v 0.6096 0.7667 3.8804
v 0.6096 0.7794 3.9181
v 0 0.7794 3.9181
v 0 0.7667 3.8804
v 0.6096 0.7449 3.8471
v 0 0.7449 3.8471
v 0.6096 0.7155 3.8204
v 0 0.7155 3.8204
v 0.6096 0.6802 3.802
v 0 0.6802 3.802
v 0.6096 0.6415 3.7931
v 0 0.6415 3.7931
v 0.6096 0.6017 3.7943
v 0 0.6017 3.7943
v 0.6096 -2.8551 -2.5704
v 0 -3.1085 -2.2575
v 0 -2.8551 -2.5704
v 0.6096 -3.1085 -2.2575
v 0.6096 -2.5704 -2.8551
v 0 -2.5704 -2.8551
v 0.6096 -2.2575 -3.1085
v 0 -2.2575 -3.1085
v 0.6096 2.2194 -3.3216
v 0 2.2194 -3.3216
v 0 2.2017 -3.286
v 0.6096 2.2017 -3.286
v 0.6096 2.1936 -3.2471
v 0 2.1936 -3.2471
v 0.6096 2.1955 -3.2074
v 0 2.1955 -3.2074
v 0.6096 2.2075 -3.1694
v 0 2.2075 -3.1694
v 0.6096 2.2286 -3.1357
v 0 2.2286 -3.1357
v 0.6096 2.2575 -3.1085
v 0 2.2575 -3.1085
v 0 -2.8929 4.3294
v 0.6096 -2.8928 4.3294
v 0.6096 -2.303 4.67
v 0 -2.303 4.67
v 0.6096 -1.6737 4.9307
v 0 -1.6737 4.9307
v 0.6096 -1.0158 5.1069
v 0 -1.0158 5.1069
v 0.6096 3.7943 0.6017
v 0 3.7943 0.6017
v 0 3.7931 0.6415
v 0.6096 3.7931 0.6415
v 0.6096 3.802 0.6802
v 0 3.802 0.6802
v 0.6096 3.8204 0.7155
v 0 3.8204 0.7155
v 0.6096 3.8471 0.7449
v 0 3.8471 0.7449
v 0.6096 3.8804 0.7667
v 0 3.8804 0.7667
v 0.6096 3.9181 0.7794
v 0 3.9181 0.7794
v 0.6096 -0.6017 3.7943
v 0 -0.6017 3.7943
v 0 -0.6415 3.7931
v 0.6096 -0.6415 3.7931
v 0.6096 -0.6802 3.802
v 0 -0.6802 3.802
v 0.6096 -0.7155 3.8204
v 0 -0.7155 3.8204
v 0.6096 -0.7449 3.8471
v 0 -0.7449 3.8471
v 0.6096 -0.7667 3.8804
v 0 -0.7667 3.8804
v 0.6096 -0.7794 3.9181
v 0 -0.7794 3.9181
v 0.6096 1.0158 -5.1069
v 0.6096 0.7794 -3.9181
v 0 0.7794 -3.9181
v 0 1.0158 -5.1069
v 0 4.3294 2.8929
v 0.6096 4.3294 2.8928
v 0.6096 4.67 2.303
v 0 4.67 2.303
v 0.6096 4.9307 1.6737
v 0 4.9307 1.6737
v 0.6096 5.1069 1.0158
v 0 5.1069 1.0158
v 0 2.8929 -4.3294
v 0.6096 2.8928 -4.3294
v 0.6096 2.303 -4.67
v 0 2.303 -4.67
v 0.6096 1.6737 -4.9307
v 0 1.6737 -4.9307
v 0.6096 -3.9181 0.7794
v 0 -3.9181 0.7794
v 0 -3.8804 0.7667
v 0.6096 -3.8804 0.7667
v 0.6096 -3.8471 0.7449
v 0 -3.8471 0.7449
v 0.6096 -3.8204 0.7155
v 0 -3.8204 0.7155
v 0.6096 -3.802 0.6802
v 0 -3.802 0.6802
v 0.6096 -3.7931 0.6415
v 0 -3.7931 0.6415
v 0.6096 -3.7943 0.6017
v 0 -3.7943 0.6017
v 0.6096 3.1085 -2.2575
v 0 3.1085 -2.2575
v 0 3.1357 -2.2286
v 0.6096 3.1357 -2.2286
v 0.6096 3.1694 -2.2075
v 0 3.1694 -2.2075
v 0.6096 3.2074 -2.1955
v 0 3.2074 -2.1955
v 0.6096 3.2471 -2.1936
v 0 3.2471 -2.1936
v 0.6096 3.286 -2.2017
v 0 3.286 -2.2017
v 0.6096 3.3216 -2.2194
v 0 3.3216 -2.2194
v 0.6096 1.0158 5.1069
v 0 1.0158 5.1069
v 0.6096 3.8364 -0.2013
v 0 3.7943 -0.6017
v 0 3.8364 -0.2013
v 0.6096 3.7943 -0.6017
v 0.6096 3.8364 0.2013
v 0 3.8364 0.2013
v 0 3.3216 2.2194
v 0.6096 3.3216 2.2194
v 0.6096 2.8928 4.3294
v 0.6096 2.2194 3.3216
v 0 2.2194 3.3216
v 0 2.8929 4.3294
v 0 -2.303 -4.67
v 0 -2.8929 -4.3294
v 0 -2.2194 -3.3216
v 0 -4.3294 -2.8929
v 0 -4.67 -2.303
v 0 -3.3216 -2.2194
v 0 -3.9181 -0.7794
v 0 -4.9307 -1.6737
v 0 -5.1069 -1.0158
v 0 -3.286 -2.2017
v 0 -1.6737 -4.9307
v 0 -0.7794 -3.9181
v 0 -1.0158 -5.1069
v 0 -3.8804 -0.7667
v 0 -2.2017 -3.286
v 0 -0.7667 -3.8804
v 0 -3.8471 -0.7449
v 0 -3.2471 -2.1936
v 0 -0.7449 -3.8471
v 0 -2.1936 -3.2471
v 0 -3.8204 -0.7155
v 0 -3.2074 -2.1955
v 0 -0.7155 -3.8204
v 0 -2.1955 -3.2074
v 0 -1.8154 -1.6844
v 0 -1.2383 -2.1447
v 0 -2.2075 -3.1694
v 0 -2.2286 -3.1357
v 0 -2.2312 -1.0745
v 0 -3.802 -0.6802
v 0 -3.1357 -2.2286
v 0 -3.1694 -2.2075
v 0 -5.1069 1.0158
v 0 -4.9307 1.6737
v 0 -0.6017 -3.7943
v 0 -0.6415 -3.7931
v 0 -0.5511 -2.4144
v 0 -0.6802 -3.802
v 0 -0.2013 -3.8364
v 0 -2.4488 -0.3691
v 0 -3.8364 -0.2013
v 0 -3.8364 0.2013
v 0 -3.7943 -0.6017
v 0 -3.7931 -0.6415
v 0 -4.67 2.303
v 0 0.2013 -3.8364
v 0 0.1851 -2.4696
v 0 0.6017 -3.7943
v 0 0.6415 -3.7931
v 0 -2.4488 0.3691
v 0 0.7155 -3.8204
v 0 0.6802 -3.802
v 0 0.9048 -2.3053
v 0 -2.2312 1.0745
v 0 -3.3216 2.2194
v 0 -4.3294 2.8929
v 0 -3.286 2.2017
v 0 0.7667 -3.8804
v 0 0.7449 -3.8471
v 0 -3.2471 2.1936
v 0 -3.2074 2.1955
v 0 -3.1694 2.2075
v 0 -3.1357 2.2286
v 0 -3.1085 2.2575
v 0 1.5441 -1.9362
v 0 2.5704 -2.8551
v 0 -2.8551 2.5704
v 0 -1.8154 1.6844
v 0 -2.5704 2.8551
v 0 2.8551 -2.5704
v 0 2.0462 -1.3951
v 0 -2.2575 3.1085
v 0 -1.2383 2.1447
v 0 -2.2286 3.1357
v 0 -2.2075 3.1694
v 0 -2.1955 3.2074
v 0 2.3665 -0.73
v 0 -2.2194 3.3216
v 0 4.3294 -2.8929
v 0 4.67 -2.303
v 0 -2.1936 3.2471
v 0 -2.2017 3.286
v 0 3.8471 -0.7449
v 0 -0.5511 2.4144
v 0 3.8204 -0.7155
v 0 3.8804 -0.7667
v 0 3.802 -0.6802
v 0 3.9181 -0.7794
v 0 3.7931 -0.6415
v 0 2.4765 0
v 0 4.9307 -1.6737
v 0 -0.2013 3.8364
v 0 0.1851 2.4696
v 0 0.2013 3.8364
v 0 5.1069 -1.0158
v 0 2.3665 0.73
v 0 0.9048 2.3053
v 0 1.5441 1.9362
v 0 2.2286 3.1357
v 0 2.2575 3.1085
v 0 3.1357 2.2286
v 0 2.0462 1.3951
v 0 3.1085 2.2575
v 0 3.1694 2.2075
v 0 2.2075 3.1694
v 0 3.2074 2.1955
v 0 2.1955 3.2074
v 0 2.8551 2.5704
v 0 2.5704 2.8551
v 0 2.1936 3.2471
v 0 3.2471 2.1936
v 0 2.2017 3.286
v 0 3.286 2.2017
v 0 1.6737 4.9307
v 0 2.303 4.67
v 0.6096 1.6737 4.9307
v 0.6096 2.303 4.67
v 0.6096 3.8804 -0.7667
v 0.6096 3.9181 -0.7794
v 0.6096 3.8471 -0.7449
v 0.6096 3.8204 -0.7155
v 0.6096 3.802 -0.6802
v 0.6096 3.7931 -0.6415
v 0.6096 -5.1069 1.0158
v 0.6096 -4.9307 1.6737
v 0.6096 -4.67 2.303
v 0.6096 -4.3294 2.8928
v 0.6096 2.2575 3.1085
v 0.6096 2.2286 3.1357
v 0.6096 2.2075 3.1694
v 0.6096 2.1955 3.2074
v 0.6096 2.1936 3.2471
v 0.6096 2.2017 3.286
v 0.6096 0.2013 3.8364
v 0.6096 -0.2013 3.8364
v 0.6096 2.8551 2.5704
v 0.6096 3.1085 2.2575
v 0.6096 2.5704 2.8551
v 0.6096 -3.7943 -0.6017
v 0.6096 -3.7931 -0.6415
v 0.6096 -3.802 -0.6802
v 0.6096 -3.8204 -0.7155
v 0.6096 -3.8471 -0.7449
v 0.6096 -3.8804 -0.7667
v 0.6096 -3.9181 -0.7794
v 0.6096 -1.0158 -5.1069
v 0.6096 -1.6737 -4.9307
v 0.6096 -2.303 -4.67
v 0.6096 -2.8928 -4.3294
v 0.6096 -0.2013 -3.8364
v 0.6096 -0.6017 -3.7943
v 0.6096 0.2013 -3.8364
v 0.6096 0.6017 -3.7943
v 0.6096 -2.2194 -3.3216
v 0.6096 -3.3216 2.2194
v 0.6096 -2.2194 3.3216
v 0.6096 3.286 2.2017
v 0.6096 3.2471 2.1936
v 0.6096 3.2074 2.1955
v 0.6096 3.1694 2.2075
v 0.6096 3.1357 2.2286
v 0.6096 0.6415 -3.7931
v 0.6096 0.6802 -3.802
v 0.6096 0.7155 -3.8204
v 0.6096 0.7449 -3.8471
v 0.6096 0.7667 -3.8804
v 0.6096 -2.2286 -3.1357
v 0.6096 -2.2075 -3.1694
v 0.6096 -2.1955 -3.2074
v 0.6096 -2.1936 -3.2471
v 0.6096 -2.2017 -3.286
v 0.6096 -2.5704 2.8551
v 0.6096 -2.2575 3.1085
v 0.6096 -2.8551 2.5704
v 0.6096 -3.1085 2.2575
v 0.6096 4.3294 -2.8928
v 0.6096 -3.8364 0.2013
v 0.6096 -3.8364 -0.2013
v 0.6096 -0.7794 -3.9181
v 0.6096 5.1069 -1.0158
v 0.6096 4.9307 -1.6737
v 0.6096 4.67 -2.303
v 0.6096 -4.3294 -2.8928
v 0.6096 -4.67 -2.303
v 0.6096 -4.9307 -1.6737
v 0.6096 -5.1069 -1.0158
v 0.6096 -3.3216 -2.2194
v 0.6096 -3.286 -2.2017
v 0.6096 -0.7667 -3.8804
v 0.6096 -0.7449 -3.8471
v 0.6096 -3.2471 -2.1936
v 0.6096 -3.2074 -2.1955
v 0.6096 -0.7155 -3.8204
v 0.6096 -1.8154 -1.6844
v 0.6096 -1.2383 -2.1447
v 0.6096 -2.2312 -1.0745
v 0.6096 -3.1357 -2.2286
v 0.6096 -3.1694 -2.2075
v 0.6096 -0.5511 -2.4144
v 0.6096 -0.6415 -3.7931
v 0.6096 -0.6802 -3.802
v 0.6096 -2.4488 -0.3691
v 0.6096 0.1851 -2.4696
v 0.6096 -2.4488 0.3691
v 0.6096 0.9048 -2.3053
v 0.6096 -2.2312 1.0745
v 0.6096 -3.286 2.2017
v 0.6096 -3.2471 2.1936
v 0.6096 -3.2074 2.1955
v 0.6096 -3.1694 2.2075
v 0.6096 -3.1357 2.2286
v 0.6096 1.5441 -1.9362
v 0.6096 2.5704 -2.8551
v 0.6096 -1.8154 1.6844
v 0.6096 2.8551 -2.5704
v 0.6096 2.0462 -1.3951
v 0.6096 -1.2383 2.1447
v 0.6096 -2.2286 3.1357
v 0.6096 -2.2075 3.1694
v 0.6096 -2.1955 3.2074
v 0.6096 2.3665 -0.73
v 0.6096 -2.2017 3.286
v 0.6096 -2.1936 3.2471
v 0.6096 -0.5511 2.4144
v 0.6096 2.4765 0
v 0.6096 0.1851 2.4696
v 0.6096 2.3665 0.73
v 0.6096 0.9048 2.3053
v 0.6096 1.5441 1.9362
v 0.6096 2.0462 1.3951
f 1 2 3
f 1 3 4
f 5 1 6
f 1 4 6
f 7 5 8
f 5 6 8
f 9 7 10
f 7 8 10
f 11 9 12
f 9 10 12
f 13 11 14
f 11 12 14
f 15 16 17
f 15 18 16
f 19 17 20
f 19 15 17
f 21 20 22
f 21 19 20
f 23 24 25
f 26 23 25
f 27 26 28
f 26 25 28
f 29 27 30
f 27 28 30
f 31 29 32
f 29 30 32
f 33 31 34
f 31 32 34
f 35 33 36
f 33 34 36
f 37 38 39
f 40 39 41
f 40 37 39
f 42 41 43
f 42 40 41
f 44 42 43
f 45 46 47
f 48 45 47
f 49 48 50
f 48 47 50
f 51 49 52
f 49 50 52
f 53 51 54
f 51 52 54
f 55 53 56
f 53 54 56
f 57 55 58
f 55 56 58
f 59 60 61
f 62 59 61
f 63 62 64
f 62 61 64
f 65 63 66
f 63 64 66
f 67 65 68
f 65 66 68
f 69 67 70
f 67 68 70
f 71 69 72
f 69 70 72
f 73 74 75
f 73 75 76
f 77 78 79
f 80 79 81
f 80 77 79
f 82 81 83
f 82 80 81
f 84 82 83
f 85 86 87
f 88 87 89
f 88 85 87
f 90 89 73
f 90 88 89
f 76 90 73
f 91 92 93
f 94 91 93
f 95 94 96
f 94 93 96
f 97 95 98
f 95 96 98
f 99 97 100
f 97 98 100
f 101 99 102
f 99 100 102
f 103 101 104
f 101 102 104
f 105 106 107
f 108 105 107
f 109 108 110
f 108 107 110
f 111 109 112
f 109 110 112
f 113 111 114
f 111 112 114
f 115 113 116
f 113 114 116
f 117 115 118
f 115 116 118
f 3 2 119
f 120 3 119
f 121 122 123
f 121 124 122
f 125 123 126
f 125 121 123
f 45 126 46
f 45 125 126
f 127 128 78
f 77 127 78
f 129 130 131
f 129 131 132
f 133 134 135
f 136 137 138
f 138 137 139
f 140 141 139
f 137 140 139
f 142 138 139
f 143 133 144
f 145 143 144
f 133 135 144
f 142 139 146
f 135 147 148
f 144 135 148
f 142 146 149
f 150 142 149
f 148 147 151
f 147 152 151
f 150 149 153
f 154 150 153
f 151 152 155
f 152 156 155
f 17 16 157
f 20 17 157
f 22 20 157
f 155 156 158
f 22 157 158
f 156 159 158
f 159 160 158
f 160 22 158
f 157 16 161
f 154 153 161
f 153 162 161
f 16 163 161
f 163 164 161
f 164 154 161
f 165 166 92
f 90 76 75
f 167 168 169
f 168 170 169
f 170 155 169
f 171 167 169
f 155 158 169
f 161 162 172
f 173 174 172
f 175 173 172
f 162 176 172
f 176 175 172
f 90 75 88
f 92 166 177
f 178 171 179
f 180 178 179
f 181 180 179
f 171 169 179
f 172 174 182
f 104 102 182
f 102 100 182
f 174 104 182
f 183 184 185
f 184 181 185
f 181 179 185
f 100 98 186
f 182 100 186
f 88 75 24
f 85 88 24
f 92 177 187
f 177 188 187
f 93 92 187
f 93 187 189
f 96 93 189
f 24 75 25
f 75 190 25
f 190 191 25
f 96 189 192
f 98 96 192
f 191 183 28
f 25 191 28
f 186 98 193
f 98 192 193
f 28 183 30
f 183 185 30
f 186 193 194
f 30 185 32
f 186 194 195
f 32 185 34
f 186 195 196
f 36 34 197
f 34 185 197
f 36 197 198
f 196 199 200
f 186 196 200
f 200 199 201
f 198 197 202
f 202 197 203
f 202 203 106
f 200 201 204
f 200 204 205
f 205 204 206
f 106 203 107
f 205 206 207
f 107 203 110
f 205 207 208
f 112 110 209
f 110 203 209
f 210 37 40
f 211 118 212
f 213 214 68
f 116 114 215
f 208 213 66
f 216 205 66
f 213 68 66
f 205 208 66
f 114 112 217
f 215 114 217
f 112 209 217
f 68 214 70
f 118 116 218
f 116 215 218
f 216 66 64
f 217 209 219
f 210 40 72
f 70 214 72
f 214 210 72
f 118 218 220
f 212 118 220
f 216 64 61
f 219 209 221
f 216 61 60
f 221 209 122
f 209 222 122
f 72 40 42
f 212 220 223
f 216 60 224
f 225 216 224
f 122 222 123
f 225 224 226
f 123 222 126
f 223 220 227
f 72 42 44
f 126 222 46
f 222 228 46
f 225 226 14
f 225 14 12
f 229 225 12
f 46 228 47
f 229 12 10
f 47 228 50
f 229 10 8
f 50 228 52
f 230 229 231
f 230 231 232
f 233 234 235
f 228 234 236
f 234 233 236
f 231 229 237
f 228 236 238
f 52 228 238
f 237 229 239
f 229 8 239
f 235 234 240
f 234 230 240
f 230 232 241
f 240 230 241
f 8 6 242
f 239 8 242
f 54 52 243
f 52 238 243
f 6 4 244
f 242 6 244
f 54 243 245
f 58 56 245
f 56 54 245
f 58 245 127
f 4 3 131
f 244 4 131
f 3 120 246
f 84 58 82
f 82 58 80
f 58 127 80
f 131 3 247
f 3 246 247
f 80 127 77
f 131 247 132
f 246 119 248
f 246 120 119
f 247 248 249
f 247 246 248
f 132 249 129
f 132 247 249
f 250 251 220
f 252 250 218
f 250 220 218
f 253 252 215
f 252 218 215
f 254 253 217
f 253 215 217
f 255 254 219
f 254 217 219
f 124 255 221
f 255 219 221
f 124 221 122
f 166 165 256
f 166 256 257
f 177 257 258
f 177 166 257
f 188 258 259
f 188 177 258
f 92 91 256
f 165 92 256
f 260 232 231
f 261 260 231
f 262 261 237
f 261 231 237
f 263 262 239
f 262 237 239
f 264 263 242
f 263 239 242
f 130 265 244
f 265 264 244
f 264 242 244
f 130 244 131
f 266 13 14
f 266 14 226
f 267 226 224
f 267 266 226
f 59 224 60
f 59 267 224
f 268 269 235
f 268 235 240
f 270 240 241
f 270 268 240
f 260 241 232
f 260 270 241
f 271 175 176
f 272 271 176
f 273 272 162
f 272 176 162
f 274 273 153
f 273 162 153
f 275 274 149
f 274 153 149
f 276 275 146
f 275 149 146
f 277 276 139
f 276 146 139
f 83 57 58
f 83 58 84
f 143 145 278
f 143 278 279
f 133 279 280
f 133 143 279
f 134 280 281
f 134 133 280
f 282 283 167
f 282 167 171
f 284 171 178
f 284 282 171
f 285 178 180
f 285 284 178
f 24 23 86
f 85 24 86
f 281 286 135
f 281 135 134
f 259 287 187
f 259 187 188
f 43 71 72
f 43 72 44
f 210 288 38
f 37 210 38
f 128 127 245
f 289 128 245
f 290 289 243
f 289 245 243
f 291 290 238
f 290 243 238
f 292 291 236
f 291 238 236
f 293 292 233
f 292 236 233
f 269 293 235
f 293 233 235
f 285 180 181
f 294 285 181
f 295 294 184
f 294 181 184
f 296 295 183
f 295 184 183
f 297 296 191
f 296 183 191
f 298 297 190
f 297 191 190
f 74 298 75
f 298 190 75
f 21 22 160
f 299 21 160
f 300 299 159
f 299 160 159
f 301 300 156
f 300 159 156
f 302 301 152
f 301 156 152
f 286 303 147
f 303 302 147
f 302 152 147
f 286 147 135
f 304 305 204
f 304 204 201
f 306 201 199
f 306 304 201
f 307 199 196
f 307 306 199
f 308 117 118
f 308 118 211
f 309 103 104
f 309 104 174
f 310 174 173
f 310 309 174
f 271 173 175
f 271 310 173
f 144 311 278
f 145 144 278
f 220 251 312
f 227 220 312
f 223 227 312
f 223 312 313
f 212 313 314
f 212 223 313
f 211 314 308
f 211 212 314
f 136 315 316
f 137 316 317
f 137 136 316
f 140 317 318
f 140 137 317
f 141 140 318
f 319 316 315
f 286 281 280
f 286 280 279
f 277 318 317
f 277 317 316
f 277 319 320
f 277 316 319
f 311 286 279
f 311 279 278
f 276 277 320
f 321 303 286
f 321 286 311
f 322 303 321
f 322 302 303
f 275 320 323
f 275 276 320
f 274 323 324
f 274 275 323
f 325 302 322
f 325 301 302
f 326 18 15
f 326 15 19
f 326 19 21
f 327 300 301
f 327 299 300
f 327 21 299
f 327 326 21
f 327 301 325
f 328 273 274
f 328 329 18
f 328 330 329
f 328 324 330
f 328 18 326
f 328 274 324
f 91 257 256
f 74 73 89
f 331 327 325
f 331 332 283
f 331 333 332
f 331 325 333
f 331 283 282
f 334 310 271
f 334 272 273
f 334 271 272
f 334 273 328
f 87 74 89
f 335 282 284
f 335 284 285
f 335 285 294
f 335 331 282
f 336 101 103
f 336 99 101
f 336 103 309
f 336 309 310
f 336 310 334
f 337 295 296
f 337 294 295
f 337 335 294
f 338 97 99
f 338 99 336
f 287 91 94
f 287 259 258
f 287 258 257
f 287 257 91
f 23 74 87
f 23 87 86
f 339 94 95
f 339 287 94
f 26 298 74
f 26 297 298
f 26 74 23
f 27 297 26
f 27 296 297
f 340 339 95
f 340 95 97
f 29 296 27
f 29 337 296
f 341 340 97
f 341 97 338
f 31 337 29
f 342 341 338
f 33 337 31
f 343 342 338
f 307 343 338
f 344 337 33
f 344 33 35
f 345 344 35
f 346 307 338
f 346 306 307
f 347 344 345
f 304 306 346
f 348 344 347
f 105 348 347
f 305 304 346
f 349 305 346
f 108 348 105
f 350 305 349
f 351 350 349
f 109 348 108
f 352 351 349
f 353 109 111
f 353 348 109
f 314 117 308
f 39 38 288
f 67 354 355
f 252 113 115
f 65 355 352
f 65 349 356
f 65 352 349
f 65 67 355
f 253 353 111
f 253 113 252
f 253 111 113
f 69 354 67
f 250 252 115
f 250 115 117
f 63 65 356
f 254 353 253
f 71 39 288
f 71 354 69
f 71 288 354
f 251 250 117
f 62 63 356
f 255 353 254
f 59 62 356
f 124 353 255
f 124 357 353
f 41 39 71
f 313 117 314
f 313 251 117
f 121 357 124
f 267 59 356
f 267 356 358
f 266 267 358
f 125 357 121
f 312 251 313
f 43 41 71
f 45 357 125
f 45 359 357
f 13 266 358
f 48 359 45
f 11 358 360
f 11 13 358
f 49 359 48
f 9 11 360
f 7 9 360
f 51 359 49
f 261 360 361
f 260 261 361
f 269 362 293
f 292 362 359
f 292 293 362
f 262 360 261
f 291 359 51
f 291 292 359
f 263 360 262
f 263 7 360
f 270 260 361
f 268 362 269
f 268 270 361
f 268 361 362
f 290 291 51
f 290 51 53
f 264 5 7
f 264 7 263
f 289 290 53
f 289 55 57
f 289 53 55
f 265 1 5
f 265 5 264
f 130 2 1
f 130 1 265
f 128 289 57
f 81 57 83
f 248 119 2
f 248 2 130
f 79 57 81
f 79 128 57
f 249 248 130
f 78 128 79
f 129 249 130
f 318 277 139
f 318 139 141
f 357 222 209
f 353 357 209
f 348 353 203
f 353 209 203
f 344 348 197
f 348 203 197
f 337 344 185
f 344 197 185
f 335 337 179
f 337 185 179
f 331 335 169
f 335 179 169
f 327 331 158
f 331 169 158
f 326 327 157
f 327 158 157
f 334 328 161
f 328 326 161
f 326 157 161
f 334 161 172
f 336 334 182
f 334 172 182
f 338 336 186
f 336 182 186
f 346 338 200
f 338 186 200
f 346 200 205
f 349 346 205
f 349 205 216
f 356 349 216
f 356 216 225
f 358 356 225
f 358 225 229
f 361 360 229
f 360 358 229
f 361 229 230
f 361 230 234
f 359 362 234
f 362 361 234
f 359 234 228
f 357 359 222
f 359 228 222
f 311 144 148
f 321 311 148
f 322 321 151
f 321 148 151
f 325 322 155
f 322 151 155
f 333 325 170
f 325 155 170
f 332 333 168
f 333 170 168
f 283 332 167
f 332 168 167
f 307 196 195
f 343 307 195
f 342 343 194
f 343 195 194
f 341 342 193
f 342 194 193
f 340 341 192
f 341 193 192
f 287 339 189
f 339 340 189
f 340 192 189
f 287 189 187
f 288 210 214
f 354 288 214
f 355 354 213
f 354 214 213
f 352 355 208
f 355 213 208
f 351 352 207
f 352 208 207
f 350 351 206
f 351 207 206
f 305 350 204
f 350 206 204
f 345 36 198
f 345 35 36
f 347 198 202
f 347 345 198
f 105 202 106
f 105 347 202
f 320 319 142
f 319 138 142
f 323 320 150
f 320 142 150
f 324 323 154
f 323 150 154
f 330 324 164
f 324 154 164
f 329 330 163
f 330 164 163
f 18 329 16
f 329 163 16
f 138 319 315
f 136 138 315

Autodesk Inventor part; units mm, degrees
ref_plane "YZ Plane" through (0, 0, 0) normal (1, 0, 0) x (0, 1, 0)
ref_plane "XZ Plane" through (0, 0, 0) normal (0, 1, 0) x (-1, 0, 0)
sketch "Sketch1" plane through (0, 0, 0) normal (1, 0, 0) x (0, 1, 0)
  circle A0 centre (0, 0) radius 5.207
  circle A1 centre (0, 0) radius 2.4765
  dimension "d0" = 10.414
  dimension "d1" = 4.953
extrude "Body" add sketch "Sketch1" along normal blind 0.6096
sketch "Sketch2" plane through (0.6096, 0, 0) normal (1, 0, 0) x (0, 0, -1)
  circle A0 centre (0, 0) radius 5.207 projected
  line L0 (0, 0) -> (0, 5.207) construction
  arc A1 (1.0158, 5.1069) -> (-1.0158, 5.1069) centre (0, 0) ccw
  arc A2 (0.7495, 3.7679) -> (-0.7495, 3.7679) centre (0, 0) ccw
  line L1 (-0.7495, 3.7679) -> (-1.0158, 5.1069)
  line L2 (0.7495, 3.7679) -> (1.0158, 5.1069)
  line L3 (-0.7495, 3.7679) -> (0, 0) construction
  line L4 (0, 0) -> (0.7495, 3.7679) construction
  dimension "d4" = 22.5
  dimension "d5" = 7.6835
extrude "Cut" cut sketch "Sketch2" against normal through all contours L2 A2 L1 A0 picked at (-0.0838, 4.7417)
fillet "Fillet1" radius 0.1562 2 edges at (0.3048, 3.7679, 0.7495) (0.3048, 3.7679, -0.7495)
pattern_circular "Cuts" count 8 over 360 about axis through (0, 0, 0) along (1, 0, 0) of "Cut", "Fillet1"
ref_plane "Work Plane1" through (0, 0, 0) normal (0, -1, 0) x (1, 0, 0)
equation "\"d0\" = SD2"
equation "\"d1\" = SD1"
equation "\"d2\" = SD"
equation "\"d5\" = 0.5 * SD2 + 0.5 * SD1"
equation "\"d6\" = SD"
equation "\"d8\" = 0.015 * SD2"
equation "\"SD\" = 0.6096"
equation "\"SD1\" = 4.953"
equation "\"SD2\" = 10.414"
equation "\"NND\" = 4.826"
properties part number "ASME B18.21.1 - No. 10. Carbon Steel"
